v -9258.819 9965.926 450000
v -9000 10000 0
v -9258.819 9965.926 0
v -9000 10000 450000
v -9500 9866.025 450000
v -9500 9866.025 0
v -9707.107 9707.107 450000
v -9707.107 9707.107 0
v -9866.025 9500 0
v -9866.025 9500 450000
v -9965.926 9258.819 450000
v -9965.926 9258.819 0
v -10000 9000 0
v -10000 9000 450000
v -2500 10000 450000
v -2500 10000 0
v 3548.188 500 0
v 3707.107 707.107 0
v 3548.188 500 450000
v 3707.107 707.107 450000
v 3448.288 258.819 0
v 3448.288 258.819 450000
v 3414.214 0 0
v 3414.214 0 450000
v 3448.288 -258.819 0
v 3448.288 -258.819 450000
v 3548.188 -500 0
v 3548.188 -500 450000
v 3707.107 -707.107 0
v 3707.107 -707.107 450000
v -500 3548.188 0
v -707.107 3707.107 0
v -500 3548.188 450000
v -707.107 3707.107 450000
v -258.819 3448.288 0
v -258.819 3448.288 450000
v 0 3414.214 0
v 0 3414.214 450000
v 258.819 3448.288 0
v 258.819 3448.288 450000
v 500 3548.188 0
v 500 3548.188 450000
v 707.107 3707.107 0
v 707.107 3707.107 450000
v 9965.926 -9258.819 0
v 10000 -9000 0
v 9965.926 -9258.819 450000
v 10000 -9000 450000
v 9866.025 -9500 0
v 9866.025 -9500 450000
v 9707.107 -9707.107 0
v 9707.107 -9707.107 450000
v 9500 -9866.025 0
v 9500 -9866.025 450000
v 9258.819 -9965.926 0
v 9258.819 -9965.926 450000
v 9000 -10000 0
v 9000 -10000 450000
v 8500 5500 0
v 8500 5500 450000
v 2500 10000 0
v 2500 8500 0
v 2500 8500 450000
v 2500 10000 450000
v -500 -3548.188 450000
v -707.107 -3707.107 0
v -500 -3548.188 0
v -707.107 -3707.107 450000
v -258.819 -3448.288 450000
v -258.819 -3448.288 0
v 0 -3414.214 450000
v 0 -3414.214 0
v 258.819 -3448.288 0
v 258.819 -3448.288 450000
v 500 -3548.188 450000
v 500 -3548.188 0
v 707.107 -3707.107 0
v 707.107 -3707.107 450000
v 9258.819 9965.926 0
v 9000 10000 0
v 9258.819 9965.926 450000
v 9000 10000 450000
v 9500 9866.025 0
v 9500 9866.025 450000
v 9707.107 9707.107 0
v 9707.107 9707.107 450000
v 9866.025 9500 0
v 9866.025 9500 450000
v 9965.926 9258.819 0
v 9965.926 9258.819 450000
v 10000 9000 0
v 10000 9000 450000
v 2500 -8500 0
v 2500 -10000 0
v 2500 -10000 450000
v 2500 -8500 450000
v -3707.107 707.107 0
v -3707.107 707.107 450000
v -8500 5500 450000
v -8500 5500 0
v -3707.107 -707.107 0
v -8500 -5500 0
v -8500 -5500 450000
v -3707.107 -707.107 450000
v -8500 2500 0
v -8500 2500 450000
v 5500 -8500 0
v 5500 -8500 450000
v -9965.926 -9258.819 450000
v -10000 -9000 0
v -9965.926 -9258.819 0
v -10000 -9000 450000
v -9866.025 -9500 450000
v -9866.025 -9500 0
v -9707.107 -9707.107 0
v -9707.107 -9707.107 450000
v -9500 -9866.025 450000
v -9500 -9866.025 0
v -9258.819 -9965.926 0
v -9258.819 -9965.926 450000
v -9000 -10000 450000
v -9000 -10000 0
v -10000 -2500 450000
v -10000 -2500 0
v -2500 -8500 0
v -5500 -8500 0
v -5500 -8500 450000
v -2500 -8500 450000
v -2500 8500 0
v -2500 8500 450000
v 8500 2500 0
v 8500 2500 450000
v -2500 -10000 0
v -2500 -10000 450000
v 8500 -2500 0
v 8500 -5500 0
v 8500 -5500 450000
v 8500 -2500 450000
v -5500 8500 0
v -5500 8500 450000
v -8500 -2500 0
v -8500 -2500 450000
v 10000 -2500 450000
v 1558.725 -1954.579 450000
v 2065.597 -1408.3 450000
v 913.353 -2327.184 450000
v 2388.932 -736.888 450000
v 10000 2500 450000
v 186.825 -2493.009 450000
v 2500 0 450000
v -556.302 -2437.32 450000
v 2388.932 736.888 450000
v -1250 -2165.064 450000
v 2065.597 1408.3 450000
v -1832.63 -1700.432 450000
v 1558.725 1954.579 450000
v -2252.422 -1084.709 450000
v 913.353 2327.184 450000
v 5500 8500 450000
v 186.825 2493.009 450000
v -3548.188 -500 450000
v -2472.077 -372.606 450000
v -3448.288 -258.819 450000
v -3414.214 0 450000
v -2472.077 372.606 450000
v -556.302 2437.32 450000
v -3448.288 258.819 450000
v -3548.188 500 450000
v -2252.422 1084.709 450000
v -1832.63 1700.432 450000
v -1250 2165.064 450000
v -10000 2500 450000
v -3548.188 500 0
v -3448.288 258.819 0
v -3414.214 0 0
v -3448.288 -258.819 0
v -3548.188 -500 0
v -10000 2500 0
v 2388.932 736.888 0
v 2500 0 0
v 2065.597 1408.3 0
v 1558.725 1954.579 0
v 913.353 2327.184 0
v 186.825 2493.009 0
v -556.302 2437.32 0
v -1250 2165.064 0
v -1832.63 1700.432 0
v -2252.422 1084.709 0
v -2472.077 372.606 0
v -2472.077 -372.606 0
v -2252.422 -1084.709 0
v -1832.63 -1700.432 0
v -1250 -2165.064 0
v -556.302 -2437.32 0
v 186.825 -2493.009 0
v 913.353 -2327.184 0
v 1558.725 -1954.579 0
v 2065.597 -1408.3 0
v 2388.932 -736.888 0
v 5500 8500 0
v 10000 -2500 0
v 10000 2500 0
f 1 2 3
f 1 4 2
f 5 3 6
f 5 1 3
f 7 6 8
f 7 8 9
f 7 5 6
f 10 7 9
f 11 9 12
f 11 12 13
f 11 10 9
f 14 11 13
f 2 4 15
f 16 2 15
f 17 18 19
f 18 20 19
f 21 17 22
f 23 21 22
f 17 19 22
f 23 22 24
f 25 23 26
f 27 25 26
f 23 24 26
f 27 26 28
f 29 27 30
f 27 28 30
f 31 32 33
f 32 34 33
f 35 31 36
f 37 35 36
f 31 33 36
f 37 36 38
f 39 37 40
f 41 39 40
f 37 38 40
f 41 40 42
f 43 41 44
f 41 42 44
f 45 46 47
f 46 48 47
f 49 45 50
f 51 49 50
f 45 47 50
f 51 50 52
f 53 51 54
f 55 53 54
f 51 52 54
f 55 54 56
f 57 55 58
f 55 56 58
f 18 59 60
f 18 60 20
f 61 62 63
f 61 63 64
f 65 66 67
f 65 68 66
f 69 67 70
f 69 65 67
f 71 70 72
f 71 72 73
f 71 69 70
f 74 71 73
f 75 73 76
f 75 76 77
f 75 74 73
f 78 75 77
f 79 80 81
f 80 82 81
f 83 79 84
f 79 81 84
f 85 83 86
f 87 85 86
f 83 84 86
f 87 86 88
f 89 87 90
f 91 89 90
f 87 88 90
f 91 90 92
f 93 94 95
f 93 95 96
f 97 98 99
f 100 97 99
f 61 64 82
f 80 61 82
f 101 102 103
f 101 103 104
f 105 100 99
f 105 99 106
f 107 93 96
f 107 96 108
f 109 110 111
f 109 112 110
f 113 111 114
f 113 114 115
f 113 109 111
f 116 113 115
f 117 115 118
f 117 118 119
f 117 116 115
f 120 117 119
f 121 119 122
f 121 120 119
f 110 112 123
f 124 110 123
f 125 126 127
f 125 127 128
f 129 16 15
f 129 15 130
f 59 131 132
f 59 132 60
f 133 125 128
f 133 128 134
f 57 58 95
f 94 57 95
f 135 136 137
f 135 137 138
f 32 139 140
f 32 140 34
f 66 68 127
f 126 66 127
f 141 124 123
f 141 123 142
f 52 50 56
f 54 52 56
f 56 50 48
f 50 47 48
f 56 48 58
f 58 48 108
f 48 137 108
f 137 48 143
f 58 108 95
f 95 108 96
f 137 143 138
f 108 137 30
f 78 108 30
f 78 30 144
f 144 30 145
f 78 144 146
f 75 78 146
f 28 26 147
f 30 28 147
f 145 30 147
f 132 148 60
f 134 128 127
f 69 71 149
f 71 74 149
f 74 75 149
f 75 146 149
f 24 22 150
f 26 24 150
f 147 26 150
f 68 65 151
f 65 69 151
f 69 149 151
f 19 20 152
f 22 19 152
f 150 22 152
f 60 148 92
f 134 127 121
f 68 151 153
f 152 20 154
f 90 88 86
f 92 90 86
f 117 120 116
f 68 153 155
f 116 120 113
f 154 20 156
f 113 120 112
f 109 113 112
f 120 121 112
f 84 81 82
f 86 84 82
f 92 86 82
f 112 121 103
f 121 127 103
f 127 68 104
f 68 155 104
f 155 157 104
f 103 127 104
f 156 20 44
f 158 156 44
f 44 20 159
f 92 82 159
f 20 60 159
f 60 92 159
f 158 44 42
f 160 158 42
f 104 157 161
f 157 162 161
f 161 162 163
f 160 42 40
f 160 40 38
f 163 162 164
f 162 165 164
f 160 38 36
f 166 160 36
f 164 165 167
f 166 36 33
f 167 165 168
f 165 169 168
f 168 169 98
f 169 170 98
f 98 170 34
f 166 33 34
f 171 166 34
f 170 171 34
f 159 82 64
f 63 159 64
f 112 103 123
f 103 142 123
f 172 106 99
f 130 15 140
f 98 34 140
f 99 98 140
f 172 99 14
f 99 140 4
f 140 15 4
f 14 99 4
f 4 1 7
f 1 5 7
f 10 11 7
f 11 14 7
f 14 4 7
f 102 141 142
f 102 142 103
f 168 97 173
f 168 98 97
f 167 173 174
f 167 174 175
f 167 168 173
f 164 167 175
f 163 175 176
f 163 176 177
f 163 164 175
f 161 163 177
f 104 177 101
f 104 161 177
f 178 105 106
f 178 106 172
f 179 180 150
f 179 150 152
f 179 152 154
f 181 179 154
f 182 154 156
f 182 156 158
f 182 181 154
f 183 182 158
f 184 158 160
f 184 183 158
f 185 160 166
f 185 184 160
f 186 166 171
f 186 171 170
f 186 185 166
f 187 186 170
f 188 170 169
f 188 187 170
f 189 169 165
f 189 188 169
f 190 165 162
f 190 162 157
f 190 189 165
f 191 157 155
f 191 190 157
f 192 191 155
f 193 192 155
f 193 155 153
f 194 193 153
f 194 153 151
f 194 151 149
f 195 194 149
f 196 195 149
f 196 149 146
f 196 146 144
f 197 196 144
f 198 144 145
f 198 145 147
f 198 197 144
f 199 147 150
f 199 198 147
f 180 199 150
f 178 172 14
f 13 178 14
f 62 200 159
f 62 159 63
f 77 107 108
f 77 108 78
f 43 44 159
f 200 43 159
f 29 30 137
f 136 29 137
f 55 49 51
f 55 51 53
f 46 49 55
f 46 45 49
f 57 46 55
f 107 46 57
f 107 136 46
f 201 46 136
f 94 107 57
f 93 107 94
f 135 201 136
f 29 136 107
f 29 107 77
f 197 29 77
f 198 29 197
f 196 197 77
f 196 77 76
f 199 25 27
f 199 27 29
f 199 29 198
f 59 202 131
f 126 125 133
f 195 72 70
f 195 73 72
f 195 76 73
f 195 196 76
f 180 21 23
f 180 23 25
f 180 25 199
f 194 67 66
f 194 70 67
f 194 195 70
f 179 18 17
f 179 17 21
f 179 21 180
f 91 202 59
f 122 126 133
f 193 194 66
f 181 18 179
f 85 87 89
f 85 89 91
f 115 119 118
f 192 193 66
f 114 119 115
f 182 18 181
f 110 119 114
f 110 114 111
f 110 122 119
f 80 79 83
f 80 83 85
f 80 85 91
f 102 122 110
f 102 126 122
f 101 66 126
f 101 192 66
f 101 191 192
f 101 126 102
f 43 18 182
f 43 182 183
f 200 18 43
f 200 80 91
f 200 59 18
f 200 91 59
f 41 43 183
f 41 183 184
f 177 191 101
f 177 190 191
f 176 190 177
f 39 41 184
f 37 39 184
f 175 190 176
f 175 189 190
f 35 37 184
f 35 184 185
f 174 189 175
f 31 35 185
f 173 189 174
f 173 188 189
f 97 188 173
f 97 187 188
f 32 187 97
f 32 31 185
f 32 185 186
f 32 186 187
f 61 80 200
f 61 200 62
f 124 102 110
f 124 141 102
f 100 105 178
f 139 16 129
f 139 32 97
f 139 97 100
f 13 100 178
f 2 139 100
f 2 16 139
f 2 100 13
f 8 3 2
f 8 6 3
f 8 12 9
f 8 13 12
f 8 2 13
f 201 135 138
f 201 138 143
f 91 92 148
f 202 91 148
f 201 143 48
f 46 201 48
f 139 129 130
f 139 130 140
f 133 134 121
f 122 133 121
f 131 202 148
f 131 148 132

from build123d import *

# Parameters (mm, degrees)
SKETCH_1_R      = 2500
EXTRUDE_1_DEPTH = 450000
FILLET_1_R      = 1000
FILLET_2_R      = 1000


with BuildPart() as part:
    # 草圖1 → 填料-伸長1 (new body)
    with BuildSketch(Plane.XY):
        Polygon((-2500, 10000), (-2500, 8500), (-5500, 8500), (0, 3000), (5500, 8500), (2500, 8500), (2500, 10000), (10000, 10000), (10000, 2500), (8500, 2500), (8500, 5500), (3000, 0), (8500, -5500), (8500, -2500), (10000, -2500), (10000, -10000), (2500, -10000), (2500, -8500), (5500, -8500), (0, -3000), (-5500, -8500), (-2500, -8500), (-2500, -10000), (-10000, -10000), (-10000, -2500), (-8500, -2500), (-8500, -5500), (-3000, 0), (-8500, 5500), (-8500, 2500), (-10000, 2500), (-10000, 10000), align=None)
        Circle(SKETCH_1_R, mode=Mode.SUBTRACT)
    extrude(amount=EXTRUDE_1_DEPTH)

    # 圓角1
    fillet_1_edges = [part.edges().sort_by_distance(p)[0] for p in [
        (0, -3000, 225000),
        (-3000, 0, 225000),
        (0, 3000, 225000),
        (3000, 0, 225000),
    ]]
    fillet(fillet_1_edges, radius=FILLET_1_R)

    # 圓角2
    fillet_2_edges = [part.edges().sort_by_distance(p)[0] for p in [
        (-10000, -10000, 225000),
        (-10000, 10000, 225000),
        (10000, 10000, 225000),
        (10000, -10000, 225000),
    ]]
    fillet(fillet_2_edges, radius=FILLET_2_R)


solid = part.part
